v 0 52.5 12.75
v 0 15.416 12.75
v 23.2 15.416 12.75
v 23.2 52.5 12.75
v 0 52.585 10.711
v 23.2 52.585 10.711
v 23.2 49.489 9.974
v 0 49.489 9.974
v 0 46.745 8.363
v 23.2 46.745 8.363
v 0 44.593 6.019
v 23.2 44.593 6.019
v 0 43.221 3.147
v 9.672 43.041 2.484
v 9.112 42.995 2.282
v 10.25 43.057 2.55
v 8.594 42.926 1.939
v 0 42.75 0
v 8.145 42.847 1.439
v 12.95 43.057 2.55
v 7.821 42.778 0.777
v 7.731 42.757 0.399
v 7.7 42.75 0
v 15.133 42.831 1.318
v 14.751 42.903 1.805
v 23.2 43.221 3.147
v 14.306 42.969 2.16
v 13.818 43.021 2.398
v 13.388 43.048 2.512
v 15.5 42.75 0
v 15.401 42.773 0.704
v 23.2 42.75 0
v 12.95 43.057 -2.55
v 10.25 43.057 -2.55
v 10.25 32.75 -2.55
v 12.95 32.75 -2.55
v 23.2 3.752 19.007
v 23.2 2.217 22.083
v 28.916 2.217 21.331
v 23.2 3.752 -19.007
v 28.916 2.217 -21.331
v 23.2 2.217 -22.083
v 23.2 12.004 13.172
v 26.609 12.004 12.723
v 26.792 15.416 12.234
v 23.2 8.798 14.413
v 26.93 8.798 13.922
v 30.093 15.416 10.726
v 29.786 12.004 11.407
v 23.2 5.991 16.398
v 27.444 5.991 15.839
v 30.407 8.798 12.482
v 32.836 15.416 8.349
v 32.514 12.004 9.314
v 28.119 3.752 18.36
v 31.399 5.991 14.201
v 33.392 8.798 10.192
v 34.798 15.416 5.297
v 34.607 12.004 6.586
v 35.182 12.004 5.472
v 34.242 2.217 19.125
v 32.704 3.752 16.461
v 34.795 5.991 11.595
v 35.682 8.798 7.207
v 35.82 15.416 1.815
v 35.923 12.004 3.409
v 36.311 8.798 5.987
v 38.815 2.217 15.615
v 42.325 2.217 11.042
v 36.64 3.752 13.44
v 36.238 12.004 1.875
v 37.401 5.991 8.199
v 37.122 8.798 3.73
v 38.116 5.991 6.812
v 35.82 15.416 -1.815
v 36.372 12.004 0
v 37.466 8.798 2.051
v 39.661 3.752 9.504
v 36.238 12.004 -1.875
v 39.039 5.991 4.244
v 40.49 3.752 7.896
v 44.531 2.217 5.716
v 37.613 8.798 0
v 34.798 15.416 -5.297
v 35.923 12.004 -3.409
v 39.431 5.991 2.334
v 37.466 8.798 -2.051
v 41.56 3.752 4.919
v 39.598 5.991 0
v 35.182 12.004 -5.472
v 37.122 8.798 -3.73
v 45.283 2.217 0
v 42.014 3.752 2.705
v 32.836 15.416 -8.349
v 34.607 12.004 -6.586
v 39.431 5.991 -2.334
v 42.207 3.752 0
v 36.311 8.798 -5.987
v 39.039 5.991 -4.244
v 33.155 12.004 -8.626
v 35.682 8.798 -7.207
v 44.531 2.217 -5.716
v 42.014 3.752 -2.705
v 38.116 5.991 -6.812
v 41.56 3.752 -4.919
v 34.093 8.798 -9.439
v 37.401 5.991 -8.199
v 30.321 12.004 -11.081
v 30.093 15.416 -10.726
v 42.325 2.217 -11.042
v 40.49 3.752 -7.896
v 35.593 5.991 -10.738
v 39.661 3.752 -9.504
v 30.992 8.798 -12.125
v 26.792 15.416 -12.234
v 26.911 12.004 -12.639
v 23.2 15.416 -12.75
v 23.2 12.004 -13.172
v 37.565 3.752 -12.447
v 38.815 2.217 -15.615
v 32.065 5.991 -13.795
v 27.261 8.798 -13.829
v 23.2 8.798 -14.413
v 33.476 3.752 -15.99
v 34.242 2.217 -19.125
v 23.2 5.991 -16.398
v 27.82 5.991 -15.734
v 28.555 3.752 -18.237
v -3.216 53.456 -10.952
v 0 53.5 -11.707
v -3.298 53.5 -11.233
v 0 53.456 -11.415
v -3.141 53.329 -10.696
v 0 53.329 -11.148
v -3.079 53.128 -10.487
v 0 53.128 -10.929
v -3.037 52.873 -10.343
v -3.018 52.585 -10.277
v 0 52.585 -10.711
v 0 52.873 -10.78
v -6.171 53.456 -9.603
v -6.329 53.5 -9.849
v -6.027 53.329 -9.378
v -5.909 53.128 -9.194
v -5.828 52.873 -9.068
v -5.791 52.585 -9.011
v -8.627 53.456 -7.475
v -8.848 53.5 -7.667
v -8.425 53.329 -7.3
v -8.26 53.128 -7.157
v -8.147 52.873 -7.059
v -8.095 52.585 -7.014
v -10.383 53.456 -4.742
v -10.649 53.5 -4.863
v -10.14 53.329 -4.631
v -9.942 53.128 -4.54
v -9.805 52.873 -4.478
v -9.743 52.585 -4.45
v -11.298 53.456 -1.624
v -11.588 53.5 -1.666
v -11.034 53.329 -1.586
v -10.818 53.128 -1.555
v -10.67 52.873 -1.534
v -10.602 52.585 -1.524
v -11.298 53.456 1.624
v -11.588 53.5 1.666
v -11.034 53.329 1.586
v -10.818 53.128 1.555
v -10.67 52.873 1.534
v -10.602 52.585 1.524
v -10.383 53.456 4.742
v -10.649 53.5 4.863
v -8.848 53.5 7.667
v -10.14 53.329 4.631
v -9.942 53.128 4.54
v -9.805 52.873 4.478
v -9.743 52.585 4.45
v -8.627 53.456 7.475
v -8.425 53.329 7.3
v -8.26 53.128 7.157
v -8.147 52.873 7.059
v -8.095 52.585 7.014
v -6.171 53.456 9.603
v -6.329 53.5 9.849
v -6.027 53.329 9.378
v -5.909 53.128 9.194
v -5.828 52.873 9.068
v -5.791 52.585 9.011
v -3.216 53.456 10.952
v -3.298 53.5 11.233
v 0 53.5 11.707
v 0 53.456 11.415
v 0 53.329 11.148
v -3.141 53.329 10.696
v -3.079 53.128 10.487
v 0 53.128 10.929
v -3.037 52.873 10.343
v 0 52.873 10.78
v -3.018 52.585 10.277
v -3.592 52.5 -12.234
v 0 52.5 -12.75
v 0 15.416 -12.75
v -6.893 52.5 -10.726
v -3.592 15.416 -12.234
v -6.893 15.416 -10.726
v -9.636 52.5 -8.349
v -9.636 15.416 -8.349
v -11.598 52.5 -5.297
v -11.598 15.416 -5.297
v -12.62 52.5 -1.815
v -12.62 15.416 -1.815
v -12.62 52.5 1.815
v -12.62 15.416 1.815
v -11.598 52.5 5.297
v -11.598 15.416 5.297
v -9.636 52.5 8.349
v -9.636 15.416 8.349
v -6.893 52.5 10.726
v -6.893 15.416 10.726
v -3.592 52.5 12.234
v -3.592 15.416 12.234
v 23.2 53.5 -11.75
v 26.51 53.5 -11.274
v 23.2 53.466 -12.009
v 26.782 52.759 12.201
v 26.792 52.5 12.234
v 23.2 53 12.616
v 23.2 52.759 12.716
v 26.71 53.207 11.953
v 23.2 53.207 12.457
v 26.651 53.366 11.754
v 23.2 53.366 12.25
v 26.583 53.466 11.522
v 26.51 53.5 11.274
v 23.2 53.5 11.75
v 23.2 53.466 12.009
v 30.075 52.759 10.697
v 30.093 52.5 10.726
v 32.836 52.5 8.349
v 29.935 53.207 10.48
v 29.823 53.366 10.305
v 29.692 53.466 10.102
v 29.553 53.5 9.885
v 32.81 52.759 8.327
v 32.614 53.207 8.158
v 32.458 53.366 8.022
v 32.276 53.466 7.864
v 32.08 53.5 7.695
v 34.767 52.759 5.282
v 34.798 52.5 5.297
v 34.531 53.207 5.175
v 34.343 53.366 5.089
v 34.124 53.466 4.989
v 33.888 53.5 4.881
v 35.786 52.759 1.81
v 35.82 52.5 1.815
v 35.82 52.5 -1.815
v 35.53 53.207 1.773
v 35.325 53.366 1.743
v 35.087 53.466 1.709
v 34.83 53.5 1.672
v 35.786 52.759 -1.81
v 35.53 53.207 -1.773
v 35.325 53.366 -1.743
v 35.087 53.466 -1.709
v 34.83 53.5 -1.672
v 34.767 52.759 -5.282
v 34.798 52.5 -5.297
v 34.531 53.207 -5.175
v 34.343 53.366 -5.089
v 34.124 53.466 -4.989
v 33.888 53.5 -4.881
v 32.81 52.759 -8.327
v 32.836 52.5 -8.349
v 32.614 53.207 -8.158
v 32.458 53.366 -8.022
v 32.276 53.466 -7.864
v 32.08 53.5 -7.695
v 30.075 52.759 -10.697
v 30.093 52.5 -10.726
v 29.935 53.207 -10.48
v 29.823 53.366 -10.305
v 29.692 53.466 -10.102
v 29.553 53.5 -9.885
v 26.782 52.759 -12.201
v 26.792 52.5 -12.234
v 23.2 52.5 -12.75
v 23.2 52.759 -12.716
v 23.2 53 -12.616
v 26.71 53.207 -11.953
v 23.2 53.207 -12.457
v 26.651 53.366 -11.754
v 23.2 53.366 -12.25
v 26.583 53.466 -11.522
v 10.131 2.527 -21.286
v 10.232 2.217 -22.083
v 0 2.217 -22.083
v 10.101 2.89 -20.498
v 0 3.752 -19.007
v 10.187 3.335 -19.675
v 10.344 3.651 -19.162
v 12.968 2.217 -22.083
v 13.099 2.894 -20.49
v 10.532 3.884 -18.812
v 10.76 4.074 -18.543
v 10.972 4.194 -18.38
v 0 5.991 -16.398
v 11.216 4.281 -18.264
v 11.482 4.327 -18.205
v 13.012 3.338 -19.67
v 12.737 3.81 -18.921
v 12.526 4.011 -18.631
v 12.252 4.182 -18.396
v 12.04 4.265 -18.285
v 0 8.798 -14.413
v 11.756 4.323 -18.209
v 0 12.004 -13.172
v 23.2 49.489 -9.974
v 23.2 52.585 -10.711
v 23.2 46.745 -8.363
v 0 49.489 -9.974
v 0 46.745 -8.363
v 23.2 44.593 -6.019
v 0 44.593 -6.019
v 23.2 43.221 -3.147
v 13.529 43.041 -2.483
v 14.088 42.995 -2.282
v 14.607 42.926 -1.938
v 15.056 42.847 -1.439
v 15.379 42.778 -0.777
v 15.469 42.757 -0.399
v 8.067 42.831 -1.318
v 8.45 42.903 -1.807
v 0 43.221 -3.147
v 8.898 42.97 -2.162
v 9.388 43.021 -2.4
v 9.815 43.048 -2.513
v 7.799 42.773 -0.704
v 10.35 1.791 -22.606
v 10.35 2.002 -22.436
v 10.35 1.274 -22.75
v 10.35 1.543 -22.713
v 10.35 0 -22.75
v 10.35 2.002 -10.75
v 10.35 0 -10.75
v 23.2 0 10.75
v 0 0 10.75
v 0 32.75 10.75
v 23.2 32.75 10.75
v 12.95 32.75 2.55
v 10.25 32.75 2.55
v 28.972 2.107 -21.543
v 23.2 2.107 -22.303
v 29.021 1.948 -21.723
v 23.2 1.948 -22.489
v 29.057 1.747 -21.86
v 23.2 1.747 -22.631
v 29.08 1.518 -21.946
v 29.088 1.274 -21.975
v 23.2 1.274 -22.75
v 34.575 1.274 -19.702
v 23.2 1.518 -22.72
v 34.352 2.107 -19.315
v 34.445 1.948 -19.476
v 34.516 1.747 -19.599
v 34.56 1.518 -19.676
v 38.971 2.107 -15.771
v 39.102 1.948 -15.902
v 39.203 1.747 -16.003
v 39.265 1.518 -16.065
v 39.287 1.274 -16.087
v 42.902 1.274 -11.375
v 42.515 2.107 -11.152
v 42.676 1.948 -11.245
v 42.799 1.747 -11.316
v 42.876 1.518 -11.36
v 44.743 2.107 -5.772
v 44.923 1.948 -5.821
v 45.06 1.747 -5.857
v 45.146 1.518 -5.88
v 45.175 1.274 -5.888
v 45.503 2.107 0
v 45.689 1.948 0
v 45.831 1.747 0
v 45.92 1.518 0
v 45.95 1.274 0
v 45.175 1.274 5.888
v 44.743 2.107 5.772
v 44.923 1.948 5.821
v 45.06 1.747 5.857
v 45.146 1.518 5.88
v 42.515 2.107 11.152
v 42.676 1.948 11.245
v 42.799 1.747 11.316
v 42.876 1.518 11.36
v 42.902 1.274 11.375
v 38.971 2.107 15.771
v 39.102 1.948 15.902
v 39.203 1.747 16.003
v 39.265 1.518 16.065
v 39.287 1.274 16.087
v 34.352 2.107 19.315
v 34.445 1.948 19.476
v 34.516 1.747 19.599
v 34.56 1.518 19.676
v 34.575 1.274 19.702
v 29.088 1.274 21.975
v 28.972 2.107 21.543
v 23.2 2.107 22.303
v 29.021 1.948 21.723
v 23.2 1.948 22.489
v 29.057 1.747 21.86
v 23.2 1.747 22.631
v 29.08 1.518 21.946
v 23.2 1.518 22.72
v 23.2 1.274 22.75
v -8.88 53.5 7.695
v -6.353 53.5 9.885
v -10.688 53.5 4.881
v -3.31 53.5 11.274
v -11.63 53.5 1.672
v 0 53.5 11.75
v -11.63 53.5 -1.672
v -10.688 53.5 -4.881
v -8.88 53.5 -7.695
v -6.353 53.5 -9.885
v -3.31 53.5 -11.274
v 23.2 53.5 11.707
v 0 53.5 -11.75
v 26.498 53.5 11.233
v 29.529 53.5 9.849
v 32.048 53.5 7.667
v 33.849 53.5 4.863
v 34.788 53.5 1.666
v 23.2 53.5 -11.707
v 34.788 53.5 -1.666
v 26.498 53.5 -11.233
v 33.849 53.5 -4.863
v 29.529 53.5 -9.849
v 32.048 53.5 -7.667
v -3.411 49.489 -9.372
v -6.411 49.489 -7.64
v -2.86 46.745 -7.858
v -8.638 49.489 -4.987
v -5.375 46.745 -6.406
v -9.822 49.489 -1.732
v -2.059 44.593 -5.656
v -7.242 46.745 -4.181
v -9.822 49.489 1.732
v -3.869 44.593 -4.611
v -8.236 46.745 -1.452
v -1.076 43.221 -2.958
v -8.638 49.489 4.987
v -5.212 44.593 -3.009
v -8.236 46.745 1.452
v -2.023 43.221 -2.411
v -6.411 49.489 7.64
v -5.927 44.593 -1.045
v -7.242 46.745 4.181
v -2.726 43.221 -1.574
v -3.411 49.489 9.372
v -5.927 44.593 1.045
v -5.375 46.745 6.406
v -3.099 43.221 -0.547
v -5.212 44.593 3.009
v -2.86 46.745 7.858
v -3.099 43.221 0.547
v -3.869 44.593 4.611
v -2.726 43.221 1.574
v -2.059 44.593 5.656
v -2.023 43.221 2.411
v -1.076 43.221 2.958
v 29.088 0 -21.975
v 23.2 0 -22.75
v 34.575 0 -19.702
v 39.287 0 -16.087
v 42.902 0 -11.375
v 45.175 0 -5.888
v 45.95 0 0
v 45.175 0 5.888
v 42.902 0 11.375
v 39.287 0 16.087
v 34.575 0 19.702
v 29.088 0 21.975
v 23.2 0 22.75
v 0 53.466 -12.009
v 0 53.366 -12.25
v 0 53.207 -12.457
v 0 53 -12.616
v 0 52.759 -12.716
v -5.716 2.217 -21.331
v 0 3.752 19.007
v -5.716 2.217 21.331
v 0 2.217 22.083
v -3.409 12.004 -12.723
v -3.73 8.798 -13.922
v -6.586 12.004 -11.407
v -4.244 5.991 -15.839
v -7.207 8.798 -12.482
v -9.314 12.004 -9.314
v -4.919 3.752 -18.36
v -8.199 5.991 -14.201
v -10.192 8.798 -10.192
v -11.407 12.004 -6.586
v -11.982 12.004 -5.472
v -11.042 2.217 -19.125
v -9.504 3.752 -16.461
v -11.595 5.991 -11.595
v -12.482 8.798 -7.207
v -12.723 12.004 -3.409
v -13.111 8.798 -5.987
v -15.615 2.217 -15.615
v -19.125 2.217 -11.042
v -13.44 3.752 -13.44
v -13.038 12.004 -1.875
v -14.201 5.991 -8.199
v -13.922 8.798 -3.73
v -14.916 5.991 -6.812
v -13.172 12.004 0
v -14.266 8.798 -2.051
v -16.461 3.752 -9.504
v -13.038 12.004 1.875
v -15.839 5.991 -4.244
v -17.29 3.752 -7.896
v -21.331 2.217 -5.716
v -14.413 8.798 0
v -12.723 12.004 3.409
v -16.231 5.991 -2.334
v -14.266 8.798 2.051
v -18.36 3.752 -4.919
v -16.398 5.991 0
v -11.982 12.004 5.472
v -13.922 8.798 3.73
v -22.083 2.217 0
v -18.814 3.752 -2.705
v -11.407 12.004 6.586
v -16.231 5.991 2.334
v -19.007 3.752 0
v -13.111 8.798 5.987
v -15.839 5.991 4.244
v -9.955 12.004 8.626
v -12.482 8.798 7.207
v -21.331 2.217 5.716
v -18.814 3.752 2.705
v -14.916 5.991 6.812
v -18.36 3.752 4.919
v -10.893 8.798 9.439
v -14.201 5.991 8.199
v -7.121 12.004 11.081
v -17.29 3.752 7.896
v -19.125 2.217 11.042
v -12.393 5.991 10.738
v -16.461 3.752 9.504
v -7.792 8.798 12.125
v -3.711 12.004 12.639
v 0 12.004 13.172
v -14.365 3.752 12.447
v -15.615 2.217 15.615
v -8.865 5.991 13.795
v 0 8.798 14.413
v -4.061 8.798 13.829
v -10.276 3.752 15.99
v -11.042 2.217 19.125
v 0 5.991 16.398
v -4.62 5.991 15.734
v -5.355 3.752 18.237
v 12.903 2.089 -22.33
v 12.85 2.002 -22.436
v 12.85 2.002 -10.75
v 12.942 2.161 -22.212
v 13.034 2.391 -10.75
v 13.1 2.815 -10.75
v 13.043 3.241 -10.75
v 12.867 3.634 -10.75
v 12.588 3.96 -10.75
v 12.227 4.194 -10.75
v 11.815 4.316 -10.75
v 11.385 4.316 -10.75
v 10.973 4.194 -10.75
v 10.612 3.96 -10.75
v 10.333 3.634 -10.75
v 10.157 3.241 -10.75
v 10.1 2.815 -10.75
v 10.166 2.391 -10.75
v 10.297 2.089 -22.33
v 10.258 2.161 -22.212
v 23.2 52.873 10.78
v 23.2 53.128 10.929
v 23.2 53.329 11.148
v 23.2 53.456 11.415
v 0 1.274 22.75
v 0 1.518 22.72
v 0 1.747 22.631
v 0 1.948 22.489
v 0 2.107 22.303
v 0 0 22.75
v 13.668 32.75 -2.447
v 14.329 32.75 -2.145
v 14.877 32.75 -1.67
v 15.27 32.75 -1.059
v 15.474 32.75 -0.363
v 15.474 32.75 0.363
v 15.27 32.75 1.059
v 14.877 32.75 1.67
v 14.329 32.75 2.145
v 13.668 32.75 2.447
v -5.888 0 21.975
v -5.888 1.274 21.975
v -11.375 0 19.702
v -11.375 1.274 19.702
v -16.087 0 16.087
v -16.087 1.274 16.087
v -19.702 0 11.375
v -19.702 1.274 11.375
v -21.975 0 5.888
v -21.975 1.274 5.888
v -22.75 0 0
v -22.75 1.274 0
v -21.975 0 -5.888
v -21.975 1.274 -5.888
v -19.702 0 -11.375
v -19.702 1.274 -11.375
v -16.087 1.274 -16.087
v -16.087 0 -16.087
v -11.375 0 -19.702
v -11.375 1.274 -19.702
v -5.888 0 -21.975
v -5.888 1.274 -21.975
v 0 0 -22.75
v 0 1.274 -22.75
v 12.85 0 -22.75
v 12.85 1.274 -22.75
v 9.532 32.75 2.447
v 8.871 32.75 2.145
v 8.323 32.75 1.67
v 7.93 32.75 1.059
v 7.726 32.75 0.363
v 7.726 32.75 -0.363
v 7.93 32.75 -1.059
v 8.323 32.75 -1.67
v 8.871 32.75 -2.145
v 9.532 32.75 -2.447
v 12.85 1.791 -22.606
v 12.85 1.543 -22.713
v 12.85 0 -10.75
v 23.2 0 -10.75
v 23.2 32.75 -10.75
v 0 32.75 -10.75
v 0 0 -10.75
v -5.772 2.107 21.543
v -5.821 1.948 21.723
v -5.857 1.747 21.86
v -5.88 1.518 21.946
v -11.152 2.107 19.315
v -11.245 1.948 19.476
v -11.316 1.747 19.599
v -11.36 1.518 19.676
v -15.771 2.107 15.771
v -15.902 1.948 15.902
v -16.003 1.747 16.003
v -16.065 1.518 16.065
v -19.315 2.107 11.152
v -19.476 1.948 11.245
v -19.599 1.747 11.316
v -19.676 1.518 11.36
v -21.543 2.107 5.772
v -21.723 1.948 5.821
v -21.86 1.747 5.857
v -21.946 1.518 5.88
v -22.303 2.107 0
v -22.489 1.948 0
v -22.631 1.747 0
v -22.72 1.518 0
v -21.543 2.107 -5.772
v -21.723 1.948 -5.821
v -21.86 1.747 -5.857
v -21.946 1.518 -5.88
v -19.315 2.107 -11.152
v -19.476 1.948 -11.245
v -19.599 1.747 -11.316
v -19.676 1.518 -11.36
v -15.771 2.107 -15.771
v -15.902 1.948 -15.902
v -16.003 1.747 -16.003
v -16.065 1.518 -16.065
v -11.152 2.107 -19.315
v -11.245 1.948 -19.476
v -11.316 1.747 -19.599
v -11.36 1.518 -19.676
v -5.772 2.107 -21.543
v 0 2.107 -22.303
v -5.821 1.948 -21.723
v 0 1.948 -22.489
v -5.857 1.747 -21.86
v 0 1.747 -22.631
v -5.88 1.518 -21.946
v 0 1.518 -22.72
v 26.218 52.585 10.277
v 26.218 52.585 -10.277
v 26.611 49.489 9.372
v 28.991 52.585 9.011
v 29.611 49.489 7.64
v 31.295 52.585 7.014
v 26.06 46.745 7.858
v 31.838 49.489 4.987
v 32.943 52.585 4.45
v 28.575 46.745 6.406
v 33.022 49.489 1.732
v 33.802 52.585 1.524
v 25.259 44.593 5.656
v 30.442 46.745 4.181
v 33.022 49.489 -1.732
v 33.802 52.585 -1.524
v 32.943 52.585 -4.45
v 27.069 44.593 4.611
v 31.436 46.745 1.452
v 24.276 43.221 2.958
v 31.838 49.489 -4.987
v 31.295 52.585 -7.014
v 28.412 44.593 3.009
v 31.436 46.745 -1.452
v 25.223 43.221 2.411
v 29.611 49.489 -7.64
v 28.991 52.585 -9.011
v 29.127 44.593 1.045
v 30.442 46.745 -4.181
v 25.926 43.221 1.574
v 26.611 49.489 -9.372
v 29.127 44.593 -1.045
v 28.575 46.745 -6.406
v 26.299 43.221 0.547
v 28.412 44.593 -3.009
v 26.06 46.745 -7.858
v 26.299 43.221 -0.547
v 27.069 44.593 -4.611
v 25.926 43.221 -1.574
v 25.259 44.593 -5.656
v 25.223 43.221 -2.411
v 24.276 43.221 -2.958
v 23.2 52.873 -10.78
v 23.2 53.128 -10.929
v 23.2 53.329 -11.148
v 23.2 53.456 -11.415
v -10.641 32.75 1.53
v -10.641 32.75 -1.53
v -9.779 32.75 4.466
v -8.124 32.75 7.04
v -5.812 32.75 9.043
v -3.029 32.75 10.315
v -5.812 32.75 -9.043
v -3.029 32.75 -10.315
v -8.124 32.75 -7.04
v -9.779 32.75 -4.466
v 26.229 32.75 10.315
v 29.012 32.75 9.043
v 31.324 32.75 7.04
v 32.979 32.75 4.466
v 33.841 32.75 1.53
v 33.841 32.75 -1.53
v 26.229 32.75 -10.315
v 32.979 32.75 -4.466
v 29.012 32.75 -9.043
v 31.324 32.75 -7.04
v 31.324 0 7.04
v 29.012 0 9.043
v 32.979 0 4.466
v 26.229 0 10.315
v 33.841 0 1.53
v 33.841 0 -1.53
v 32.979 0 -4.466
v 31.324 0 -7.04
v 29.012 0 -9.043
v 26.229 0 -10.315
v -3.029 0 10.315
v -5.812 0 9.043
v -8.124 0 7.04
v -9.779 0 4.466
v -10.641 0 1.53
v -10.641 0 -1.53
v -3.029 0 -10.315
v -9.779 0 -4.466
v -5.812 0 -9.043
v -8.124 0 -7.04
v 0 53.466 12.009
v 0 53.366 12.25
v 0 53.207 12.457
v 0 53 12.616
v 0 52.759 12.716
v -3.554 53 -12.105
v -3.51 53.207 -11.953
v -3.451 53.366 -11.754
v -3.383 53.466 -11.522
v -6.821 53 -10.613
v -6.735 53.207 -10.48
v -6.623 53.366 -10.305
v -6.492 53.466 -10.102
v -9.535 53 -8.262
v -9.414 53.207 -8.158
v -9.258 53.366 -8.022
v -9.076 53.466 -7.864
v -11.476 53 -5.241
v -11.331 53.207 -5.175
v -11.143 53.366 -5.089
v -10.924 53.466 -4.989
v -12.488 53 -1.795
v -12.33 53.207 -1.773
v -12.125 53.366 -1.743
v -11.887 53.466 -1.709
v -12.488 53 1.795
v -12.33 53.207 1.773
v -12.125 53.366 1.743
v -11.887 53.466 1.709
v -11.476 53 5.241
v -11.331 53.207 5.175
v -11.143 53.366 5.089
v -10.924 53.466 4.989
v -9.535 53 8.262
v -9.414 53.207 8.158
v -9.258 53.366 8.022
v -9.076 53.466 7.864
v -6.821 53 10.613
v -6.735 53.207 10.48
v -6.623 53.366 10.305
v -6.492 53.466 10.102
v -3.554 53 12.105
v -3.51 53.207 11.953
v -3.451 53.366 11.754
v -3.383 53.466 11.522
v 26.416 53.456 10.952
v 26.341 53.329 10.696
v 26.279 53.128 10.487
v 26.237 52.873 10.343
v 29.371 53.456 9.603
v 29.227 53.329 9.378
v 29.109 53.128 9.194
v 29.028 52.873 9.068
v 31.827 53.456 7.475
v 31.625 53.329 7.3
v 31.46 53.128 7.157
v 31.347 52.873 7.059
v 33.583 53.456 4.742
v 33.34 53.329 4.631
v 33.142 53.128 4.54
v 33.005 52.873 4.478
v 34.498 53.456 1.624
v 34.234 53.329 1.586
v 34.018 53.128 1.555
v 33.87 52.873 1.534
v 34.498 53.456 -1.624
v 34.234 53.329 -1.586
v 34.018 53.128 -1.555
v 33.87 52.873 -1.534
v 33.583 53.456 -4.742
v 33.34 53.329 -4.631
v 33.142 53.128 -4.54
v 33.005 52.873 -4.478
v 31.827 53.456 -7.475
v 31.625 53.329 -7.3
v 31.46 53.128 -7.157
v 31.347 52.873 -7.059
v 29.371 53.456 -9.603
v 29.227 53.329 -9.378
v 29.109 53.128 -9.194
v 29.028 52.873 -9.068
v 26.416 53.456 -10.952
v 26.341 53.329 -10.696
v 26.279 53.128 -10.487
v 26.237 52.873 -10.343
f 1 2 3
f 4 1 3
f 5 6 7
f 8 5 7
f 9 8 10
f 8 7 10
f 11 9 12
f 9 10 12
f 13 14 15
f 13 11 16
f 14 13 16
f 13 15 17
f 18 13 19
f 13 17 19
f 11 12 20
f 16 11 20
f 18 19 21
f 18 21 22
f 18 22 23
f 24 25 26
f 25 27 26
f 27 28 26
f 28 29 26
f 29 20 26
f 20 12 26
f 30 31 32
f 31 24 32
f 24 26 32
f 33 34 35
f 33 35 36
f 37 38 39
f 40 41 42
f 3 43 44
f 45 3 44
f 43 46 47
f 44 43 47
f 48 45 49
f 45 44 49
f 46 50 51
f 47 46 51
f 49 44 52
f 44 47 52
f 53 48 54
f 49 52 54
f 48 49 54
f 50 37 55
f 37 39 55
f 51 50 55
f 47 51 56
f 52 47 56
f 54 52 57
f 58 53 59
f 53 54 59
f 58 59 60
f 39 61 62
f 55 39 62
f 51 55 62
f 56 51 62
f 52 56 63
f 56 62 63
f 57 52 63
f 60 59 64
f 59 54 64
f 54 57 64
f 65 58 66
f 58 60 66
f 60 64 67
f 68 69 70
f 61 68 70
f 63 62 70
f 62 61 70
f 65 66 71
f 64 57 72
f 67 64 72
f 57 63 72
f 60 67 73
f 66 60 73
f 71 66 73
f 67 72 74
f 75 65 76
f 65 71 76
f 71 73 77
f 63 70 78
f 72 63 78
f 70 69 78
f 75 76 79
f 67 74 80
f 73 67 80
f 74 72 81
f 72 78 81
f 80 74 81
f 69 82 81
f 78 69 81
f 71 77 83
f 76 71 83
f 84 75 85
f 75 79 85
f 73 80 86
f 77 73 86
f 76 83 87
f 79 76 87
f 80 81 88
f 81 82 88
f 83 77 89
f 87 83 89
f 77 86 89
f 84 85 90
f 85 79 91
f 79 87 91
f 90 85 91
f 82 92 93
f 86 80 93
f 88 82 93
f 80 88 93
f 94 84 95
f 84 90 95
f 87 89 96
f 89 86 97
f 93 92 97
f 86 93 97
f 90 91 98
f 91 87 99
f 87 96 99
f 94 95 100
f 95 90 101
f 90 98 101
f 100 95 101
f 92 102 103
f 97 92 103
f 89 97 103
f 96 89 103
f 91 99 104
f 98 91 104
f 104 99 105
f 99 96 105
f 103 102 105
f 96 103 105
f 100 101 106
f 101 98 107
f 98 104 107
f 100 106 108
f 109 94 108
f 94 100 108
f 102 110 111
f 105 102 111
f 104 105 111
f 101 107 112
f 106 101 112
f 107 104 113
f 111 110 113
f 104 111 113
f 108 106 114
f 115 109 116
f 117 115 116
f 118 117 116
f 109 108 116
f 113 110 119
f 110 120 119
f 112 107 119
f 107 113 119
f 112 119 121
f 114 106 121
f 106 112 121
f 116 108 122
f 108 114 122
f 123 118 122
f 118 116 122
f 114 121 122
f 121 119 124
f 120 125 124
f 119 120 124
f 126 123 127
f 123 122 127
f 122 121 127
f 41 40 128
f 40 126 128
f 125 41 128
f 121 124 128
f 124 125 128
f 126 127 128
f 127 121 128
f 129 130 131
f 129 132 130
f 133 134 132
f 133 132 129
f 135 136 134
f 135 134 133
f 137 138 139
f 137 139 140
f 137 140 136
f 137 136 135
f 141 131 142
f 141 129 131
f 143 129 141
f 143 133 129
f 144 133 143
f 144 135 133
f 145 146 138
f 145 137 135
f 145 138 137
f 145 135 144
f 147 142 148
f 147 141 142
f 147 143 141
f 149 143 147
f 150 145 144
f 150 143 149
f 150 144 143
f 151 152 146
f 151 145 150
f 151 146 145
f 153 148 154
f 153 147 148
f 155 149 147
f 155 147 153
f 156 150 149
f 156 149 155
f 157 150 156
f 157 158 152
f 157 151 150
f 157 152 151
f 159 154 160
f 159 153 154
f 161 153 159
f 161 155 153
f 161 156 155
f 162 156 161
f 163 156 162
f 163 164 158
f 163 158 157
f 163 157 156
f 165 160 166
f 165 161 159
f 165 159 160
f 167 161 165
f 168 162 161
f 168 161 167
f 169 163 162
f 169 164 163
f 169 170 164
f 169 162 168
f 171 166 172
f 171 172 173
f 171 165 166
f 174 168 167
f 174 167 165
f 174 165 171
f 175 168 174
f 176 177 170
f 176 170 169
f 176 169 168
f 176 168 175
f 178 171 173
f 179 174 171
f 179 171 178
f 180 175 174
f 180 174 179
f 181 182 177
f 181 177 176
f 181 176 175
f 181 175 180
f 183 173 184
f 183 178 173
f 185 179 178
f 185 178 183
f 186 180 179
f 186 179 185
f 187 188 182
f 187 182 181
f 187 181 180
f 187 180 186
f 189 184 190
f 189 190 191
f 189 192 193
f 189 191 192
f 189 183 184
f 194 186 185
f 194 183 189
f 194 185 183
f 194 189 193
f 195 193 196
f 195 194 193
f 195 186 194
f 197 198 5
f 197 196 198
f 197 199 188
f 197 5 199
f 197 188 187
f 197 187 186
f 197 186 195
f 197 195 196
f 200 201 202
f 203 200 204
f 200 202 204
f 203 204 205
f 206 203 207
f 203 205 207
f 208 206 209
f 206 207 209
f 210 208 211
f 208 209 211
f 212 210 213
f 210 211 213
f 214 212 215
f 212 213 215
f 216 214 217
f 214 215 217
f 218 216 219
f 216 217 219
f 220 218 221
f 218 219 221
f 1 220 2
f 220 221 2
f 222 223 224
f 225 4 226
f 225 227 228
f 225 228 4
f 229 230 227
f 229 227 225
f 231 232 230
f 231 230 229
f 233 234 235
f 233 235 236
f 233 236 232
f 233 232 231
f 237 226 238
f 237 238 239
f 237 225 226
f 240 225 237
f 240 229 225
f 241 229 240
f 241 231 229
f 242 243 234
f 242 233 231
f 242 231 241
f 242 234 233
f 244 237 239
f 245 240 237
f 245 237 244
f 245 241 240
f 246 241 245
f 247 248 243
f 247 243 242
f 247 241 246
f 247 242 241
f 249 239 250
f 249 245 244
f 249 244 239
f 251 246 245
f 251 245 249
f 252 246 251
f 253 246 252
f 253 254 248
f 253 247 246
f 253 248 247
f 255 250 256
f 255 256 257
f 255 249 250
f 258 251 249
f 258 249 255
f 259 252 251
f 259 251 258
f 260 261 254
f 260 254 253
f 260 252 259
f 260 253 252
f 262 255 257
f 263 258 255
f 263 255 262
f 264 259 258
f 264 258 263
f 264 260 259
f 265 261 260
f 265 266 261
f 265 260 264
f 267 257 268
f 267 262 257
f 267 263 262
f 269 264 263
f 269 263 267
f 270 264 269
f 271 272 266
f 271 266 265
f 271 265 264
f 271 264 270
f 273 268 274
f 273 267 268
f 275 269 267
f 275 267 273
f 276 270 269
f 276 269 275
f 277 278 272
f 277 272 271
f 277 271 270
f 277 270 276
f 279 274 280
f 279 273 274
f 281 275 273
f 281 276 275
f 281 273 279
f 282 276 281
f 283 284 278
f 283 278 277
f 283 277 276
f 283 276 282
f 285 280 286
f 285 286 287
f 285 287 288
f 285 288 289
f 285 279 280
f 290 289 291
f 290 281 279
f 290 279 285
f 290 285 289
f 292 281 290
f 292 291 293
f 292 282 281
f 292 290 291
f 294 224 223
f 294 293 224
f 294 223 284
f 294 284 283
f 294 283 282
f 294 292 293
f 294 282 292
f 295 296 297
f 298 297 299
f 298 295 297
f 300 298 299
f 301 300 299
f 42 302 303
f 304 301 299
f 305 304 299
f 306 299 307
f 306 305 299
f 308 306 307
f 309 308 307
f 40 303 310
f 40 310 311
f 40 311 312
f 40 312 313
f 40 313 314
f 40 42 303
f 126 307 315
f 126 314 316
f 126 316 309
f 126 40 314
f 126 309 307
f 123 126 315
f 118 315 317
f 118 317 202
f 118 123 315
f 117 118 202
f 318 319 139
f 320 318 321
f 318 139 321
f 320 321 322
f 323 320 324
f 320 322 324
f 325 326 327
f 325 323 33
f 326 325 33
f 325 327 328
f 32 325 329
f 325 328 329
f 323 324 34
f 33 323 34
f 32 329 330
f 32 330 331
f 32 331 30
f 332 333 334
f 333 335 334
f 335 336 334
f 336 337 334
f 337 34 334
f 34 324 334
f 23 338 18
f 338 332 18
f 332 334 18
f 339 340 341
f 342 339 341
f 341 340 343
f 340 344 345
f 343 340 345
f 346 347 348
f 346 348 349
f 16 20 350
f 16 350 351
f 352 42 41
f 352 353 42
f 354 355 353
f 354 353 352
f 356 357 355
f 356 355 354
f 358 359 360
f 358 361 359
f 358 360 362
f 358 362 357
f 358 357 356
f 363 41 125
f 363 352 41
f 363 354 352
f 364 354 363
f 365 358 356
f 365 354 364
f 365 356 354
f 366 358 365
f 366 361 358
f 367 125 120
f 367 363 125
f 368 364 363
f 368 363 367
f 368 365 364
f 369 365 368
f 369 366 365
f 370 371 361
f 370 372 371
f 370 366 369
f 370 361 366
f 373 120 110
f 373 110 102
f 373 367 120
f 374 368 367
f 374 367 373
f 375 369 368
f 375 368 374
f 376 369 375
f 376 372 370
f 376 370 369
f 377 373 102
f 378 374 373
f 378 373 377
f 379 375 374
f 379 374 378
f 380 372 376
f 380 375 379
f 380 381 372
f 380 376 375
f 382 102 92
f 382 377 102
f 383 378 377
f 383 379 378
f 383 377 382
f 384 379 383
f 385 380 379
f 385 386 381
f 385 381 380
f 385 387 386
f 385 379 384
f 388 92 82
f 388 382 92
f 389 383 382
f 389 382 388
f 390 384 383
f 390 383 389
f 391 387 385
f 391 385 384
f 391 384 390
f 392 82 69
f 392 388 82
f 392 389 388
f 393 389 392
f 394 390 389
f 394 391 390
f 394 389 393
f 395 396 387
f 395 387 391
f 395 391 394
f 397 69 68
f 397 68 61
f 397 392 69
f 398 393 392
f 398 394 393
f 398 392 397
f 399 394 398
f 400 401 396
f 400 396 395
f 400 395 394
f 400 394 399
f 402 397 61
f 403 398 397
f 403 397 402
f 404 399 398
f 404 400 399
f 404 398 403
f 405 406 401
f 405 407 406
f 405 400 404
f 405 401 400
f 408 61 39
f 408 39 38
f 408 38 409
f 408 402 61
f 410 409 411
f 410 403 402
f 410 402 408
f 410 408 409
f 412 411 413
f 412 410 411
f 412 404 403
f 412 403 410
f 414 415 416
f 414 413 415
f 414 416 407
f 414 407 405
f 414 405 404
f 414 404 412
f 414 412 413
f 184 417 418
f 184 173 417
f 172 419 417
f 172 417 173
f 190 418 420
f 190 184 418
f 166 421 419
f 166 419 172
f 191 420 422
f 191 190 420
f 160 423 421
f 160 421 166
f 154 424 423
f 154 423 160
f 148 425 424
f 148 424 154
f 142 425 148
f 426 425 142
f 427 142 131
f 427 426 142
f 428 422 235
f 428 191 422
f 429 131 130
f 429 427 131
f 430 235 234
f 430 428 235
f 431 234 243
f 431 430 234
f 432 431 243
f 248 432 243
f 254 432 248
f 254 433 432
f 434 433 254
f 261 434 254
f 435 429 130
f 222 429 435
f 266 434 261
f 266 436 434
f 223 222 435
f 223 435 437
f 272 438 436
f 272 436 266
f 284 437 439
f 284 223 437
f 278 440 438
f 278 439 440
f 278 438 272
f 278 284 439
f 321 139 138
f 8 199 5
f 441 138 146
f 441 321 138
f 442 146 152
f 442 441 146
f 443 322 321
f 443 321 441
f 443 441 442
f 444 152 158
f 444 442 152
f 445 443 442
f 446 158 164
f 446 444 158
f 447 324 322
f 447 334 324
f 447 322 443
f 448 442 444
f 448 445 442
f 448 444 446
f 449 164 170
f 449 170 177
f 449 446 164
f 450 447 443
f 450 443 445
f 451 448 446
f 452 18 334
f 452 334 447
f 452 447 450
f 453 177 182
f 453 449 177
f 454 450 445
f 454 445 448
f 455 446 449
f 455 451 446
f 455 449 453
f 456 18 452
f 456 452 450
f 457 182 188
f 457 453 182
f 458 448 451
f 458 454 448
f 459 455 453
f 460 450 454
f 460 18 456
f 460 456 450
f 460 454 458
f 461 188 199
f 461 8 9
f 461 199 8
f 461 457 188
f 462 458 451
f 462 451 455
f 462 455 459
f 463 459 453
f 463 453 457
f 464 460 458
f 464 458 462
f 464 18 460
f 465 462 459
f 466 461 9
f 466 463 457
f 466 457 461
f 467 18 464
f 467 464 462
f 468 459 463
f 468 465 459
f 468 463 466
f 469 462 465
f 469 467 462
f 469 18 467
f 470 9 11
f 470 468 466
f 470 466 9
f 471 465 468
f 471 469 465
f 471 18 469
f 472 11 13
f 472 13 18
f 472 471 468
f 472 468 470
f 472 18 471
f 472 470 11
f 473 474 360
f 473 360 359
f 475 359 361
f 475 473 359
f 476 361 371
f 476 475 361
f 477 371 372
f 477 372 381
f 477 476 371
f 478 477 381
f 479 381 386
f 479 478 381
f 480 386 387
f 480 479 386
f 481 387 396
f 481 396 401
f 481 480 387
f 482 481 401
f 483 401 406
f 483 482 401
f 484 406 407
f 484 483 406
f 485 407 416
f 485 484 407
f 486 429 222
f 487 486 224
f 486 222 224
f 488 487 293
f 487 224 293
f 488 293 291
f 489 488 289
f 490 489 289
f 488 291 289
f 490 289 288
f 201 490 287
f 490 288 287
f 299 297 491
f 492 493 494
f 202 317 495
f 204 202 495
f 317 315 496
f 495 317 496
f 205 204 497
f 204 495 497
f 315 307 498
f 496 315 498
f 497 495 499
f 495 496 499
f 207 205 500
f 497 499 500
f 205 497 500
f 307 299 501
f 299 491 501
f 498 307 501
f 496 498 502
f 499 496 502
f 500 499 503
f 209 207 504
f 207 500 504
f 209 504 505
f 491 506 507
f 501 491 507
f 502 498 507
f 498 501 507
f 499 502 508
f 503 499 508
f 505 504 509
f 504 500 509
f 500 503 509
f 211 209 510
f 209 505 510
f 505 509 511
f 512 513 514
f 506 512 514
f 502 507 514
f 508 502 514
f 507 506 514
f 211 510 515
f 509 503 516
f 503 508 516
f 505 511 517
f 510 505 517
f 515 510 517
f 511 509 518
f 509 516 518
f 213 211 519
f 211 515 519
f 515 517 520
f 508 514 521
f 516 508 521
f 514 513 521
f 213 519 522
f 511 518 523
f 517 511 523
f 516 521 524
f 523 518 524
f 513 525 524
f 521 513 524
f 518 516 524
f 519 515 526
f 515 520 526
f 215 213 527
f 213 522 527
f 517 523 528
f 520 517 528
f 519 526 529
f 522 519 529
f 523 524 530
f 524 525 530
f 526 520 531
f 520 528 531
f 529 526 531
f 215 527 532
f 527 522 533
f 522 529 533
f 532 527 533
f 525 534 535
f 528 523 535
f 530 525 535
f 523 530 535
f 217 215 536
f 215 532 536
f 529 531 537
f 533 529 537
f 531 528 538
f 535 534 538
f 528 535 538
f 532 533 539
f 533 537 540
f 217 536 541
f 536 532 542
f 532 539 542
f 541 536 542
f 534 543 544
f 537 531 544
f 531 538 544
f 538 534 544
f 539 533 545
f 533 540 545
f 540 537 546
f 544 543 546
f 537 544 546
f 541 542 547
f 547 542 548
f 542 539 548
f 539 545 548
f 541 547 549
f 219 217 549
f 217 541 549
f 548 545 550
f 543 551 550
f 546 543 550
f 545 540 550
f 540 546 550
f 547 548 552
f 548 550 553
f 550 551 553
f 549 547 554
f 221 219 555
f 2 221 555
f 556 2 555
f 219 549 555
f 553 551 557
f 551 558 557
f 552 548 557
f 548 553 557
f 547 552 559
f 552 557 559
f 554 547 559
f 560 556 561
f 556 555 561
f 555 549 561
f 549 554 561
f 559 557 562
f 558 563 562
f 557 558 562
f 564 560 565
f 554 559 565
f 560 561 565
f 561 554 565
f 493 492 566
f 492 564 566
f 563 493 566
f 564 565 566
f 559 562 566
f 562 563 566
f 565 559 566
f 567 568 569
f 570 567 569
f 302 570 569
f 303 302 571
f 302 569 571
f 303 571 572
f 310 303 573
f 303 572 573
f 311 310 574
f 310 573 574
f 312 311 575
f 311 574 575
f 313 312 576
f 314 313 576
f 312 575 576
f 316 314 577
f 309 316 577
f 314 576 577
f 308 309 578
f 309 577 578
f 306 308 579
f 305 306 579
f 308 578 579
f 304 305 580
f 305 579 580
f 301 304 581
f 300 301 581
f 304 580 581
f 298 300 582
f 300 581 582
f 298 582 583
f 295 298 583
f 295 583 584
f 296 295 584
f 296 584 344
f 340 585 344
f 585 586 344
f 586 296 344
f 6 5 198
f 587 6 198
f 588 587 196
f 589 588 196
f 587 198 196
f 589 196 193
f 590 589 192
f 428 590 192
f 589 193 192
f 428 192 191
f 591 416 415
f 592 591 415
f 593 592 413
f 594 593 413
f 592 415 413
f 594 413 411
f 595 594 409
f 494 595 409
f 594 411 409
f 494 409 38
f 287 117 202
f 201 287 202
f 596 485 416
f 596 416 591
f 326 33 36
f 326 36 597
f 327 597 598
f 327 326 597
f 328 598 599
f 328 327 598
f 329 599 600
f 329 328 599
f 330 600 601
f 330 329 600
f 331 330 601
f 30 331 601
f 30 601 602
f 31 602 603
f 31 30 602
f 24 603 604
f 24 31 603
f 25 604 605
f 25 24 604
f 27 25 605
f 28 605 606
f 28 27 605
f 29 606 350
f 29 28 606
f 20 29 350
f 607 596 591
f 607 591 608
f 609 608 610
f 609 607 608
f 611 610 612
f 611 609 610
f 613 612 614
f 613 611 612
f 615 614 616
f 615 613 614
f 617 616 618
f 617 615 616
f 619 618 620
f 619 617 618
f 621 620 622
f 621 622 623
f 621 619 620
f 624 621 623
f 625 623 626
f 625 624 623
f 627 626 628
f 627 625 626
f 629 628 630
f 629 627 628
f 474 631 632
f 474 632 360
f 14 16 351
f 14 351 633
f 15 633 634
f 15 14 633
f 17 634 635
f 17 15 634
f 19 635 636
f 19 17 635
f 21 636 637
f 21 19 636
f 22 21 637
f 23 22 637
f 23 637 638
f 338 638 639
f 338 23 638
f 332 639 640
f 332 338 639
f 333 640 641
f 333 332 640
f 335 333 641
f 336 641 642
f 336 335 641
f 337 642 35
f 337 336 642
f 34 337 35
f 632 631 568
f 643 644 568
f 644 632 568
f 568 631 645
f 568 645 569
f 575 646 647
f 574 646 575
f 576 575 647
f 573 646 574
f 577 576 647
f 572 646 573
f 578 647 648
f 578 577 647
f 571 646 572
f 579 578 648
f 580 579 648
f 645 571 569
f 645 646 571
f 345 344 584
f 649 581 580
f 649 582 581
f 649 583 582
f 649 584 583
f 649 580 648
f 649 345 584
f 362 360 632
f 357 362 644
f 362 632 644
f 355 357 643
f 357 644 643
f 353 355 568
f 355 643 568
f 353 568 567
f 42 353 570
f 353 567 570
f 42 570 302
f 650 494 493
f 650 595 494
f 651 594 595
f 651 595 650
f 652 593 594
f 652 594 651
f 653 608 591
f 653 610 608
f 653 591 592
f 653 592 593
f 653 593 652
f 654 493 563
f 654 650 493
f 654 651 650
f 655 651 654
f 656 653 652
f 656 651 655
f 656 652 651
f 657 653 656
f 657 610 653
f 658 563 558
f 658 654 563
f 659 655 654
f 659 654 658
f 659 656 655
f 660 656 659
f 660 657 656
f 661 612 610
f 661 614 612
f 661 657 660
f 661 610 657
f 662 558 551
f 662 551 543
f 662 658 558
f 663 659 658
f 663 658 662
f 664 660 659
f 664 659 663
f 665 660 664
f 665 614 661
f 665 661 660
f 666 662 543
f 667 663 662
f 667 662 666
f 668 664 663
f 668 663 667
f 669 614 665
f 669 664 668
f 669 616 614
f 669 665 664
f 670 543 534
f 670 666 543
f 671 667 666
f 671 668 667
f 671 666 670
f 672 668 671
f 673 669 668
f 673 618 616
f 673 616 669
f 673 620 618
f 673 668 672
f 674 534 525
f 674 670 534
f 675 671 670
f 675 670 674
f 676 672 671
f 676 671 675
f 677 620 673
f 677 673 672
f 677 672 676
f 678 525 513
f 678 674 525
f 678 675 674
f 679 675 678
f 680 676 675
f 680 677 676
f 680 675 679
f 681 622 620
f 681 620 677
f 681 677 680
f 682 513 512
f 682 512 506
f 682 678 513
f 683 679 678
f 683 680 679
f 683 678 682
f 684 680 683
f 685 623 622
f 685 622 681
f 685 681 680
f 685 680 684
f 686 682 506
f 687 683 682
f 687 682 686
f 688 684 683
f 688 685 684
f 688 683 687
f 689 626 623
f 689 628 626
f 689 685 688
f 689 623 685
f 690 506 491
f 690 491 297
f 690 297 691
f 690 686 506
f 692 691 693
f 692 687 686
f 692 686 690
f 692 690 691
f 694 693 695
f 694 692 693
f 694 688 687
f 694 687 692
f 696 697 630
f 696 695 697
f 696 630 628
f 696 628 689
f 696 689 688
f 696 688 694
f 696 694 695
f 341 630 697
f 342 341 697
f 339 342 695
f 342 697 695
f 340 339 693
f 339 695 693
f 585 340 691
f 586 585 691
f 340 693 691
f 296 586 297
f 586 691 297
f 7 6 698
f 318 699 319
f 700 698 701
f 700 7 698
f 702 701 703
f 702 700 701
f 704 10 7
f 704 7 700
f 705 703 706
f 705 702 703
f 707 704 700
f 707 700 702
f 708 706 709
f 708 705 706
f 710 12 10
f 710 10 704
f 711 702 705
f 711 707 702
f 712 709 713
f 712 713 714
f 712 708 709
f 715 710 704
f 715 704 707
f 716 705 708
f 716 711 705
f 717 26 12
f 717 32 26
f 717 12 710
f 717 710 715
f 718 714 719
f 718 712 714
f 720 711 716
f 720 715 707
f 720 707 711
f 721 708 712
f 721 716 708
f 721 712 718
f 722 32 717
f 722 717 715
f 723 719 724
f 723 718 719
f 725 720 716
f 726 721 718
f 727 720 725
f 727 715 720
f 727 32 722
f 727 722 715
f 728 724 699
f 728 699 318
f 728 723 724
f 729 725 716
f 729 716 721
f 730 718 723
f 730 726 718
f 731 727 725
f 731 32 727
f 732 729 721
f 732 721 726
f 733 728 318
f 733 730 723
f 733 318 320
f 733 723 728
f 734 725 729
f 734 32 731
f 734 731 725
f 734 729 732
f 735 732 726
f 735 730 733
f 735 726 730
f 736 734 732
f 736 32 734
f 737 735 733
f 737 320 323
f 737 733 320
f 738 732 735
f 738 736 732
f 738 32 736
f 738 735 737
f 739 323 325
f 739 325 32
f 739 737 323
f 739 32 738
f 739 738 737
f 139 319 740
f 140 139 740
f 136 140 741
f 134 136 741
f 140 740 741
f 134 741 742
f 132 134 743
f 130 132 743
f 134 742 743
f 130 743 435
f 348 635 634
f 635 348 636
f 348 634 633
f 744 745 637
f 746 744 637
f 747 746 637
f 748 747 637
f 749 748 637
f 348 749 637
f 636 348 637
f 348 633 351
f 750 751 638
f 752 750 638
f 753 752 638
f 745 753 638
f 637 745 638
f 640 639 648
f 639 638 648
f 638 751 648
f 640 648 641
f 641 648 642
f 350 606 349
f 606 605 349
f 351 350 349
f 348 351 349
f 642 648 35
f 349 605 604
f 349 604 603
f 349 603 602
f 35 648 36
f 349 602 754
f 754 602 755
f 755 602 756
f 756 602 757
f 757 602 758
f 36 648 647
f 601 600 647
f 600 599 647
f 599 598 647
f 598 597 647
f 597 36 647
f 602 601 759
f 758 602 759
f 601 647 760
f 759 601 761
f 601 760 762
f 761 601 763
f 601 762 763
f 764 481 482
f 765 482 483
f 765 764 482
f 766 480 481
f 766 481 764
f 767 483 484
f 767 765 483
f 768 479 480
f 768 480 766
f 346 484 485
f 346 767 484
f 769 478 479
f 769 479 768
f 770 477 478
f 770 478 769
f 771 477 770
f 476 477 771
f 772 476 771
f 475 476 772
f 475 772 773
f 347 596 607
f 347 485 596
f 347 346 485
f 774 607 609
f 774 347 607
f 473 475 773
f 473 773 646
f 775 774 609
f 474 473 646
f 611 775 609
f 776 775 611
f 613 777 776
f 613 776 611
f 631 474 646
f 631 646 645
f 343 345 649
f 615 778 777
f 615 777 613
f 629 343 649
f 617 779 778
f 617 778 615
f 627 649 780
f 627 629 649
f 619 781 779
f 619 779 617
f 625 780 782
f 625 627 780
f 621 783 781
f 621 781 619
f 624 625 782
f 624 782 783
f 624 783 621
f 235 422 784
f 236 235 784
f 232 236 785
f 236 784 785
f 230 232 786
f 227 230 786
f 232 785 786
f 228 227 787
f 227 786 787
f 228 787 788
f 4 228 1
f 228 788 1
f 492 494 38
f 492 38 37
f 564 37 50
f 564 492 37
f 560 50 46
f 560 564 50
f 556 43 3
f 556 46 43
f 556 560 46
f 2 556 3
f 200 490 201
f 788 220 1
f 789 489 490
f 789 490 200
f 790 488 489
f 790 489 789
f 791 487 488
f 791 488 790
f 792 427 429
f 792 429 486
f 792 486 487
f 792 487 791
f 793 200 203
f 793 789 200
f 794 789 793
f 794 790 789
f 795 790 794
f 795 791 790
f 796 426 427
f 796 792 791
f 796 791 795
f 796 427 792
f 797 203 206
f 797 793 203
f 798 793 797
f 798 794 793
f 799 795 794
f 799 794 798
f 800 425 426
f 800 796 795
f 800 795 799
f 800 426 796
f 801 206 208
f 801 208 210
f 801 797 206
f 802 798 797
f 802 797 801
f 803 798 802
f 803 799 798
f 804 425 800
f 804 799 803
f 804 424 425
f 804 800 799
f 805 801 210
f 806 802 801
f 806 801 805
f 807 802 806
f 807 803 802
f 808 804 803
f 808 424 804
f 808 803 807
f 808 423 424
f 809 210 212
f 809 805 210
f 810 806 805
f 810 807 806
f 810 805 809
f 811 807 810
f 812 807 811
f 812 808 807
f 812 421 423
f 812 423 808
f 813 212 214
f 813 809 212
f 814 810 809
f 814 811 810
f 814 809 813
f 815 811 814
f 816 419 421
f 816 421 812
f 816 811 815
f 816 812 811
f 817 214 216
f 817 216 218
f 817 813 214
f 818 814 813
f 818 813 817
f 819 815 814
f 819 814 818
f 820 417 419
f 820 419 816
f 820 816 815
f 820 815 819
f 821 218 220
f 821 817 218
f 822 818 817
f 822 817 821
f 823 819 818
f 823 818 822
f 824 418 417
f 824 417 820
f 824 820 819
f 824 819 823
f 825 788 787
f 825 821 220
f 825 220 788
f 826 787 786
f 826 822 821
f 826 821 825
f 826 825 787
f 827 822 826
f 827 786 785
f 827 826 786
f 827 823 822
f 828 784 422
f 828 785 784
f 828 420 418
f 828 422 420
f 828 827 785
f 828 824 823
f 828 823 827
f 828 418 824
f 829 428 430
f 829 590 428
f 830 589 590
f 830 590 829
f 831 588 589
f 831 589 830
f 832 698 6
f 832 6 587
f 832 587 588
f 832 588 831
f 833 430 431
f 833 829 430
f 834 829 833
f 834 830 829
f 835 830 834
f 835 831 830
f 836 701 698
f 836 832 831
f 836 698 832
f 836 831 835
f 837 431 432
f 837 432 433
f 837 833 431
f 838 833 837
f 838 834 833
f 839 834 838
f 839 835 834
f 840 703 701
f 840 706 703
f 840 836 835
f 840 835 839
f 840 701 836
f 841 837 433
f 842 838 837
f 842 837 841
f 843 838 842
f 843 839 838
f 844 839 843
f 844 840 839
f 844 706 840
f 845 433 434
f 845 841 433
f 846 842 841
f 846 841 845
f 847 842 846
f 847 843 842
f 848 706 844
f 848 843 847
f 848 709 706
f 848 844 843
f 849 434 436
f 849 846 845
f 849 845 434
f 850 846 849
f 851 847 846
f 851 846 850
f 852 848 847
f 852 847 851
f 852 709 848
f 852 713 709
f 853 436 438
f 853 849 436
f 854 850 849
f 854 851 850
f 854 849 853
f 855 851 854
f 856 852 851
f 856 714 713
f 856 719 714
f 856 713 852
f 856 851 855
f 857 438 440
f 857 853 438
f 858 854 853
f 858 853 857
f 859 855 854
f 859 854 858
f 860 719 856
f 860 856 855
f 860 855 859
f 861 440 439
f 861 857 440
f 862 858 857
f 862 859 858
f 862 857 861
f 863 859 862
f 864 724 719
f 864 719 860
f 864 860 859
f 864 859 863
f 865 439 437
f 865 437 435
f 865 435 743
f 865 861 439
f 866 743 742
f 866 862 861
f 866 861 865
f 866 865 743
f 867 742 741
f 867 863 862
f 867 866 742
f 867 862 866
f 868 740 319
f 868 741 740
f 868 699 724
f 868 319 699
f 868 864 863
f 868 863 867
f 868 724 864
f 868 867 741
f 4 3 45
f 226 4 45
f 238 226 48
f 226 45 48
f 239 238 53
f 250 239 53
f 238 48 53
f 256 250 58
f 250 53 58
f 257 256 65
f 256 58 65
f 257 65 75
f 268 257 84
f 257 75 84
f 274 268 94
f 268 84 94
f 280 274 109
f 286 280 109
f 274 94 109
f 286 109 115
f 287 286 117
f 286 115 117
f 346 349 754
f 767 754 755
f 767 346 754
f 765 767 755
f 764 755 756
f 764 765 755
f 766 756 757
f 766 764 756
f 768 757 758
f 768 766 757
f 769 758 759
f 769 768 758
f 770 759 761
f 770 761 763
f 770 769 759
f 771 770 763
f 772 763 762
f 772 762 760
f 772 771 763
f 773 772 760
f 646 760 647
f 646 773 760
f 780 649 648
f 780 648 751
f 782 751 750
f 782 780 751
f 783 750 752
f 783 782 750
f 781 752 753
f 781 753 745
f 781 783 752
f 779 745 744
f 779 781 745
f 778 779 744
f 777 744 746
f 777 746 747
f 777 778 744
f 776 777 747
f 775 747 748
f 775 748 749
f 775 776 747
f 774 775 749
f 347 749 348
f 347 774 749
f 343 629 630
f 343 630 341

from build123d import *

# Parameters (mm, degrees)
BOSS_EXTRUDE1_DEPTH     = 53.5
BOSS_EXTRUDE2_START     = 32.75
BOSS_EXTRUDE2_DEPTH     = 10
BOSS_EXTRUDE3_DEPTH     = 2
FILLET1_R               = 10.75
FILLET2_R               = 14
FILLET3_R               = 1
CUT_EXTRUDE4_DEPTH      = 79.076260797
CUT_EXTRUDE5_DEPTH      = 61.840180017
CUT_EXTRUDE5_DEPTH_BACK = 61.840180017


# Some blends are built 0.0001 mm under size
with BuildPart() as part:
    # Sketch2 → Boss-Extrude1 (new body)
    with BuildSketch(Plane(origin=(0, 0, 0), x_dir=(1, 0, 0), z_dir=(0, 1, 0))):
        with BuildLine():
            Line((0, -12.75), (23.2, -12.75))
            ThreePointArc((23.2, -12.75), (35.95, 0), (23.2, 12.75))
            Line((23.2, 12.75), (0, 12.75))
            ThreePointArc((0, 12.75), (-12.75, 0), (0, -12.75))
        make_face()
        with BuildLine():
            ThreePointArc((23.2, -10.75), (33.95, 0), (23.2, 10.75))
            Line((23.2, 10.75), (0, 10.75))
            ThreePointArc((0, 10.75), (-10.75, 0), (0, -10.75))
            Line((0, -10.75), (23.2, -10.75))
        make_face(mode=Mode.SUBTRACT)
    extrude(amount=BOSS_EXTRUDE1_DEPTH)

    # Sketch2<3> → Boss-Extrude2 (add)
    with BuildSketch(Plane(origin=(0, 0, 0), x_dir=(1, 0, 0), z_dir=(0, 1, 0)).offset(BOSS_EXTRUDE2_START)):
        with BuildLine():
            Line((0, -10.75), (23.2, -10.75))
            ThreePointArc((23.2, -10.75), (33.95, 0), (23.2, 10.75))
            Line((23.2, 10.75), (0, 10.75))
            ThreePointArc((0, 10.75), (-10.75, 0), (0, -10.75))
        make_face()
    extrude(amount=BOSS_EXTRUDE2_DEPTH)

    # Sketch2<4> → Boss-Extrude3 (add)
    with BuildSketch(Plane(origin=(0, 0, 0), x_dir=(1, 0, 0), z_dir=(0, 1, 0))):
        with BuildLine():
            Line((0, 22.75), (23.2, 22.75))
            ThreePointArc((23.2, 22.75), (45.95, 0), (23.2, -22.75))
            Line((23.2, -22.75), (0, -22.75))
            ThreePointArc((0, -22.75), (-22.75, 0), (0, 22.75))
        make_face()
        with BuildLine():
            ThreePointArc((23.2, -12.75), (35.95, 0), (23.2, 12.75))
            Line((23.2, 12.75), (0, 12.75))
            ThreePointArc((0, 12.75), (-12.75, 0), (0, -12.75))
            Line((0, -12.75), (23.2, -12.75))
        make_face(mode=Mode.SUBTRACT)
    extrude(amount=BOSS_EXTRUDE3_DEPTH)

    # Fillet1
    fillet1_edges = [part.edges().sort_by_distance(p)[0] for p in [
        (11.6, 42.75, -10.75),
        (33.95, 42.75, 0),
        (11.6, 42.75, 10.75),
        (-10.75, 42.75, 0),
    ]]
    fillet(fillet1_edges, radius=FILLET1_R - 0.0001)  # a hair under: the kernel refuses the full size

    # Fillet2
    # the kernel refuses this fillet: 14 mm, written as the material it adds along each edge
    with BuildSketch(Plane(origin=(23.2, 2, 0), x_dir=(0, 0, 1), z_dir=(-1, 0, 0))) as fillet2_piece_1:
        with BuildLine():
            CenterArc((26.75, 13.416407865), FILLET2_R, 180, 73.398450401)
            Line((22.75, 0), (22.67, -0.268328157))
            ThreePointArc((22.67, -0.268328157), (17.75, -0.28), (12.75, -0.28))
            Line((12.75, -0.28), (12.47, 0))
            Line((12.47, 0), (12.47, 13.416407865))
            Line((12.47, 13.416407865), (12.75, 13.416407865))
        make_face()
    revolve(axis=Axis((23.2, 2, 0), (0, 1, 0)), revolution_arc=180)
    with BuildSketch(Plane(origin=(0, 2, 12.75), x_dir=(0, 1, 0), z_dir=(1, 0, 0)), Plane(origin=(23.2, 2, -12.75), x_dir=(0, 1, 0), z_dir=(-1, 0, 0))) as fillet2_piece_2:
        with BuildLine():
            CenterArc((13.416407865, 14), FILLET2_R, 196.601549599, 73.398450401)
            Line((0, 10), (-0.268328157, 9.92))
            ThreePointArc((-0.268328157, 9.92), (-0.28, 5), (-0.28, 0))
            Line((-0.28, 0), (0, -0.28))
            Line((0, -0.28), (13.416407865, -0.28))
            Line((13.416407865, -0.28), (13.416407865, 0))
        make_face()
    extrude(amount=23.2)
    with BuildSketch(Plane(origin=(0, 2, 0), x_dir=(0, 0, -1), z_dir=(1, 0, 0))) as fillet2_piece_3:
        with BuildLine():
            CenterArc((26.75, 13.416407865), FILLET2_R, 180, 73.398450401)
            Line((22.75, 0), (22.67, -0.268328157))
            ThreePointArc((22.67, -0.268328157), (17.75, -0.28), (12.75, -0.28))
            Line((12.75, -0.28), (12.47, 0))
            Line((12.47, 0), (12.47, 13.416407865))
            Line((12.47, 13.416407865), (12.75, 13.416407865))
        make_face()
    revolve(axis=Axis((0, 2, 0), (0, 1, 0)), revolution_arc=180)

    # Fillet3
    # the kernel refuses this fillet: 1 mm, written as the material it takes off along each edge
    with BuildSketch(Plane(origin=(0, 53.5, 10.75), x_dir=(0, 0, 1), z_dir=(1, 0, 0)), Plane(origin=(23.2, 53.5, -10.75), x_dir=(0, 0, -1), z_dir=(-1, 0, 0))) as fillet3_piece_1:
        with BuildLine():
            CenterArc((0.957377651, 1), FILLET3_R, 184.881694581, 85.118305419)
            Line((-0.038994884, 0.914901403), (-0.138632138, 0.906391544))
            ThreePointArc((-0.138632138, 0.906391544), (-0.1, 0.0001), (-0.1, 0))
            Line((-0.1, 0), (0, -0.1))
            Line((0, -0.1), (0.957377651, -0.1))
            Line((0.957377651, -0.1), (0.957377651, 0))
        make_face()
    extrude(amount=23.2, mode=Mode.SUBTRACT)
    with BuildSketch(Plane(origin=(0, 53.5, 0), x_dir=(0, 0, -1), z_dir=(1, 0, 0))) as fillet3_piece_2:
        with BuildLine():
            CenterArc((11.707377651, -1), FILLET3_R, 90, 85.118305419)
            Line((10.711005116, -0.914901403), (10.611367862, -0.906391544))
            ThreePointArc((10.611367862, -0.906391544), (10.65, -0.0001), (10.65, 0))
            Line((10.65, 0), (10.75, 0.1))
            Line((10.75, 0.1), (11.707377651, 0.1))
            Line((11.707377651, 0.1), (11.707377651, 0))
        make_face()
    revolve(axis=Axis((0, 53.5, 0), (0, 1, 0)), revolution_arc=180, mode=Mode.SUBTRACT)
    with BuildSketch(Plane(origin=(0, 53.5, 12.75), x_dir=(0, -1, 0), z_dir=(1, 0, 0))) as fillet3_piece_3:
        with BuildLine():
            CenterArc((FILLET3_R, FILLET3_R), FILLET3_R, 180, 90)
            Line((0, FILLET3_R), (0, 0))
            Line((0, 0), (FILLET3_R, 0))
        make_face()
    extrude(amount=23.2, mode=Mode.SUBTRACT)
    with BuildSketch(Plane(origin=(23.2, 53.5, 0), x_dir=(0, 0, 1), z_dir=(-1, 0, 0))) as fillet3_piece_4:
        with BuildLine():
            CenterArc((12.75 - FILLET3_R, -FILLET3_R), FILLET3_R, 0, 90)
            Line((12.75, -FILLET3_R), (12.75, 0))
            Line((12.75, 0), (12.75 - FILLET3_R, 0))
        make_face()
    revolve(axis=Axis((23.2, 53.5, 0), (0, 1, 0)), revolution_arc=180, mode=Mode.SUBTRACT)
    with BuildSketch(Plane(origin=(23.2, 53.5, -12.75), x_dir=(0, 0, 1), z_dir=(-1, 0, 0))) as fillet3_piece_5:
        with BuildLine():
            CenterArc((FILLET3_R, -FILLET3_R), FILLET3_R, 90, 90)
            Line((0, -FILLET3_R), (0, 0))
            Line((0, 0), (FILLET3_R, 0))
        make_face()
    extrude(amount=23.2, mode=Mode.SUBTRACT)
    with BuildSketch(Plane(origin=(0, 53.5, 0), x_dir=(0, 0, -1), z_dir=(1, 0, 0))) as fillet3_piece_6:
        with BuildLine():
            CenterArc((12.75 - FILLET3_R, -FILLET3_R), FILLET3_R, 0, 90)
            Line((12.75 - FILLET3_R, 0), (12.75, 0))
            Line((12.75, 0), (12.75, -FILLET3_R))
        make_face()
    revolve(axis=Axis((0, 53.5, 0), (0, 1, 0)), revolution_arc=180, mode=Mode.SUBTRACT)
    with BuildSketch(Plane(origin=(0, 2, -22.75), x_dir=(0, 0.30962089103713925, 0.9508600863604318), z_dir=(1, 0, 0)), Plane(origin=(23.2, 2, 22.75), x_dir=(0, 0.30962089103713925, -0.9508600863604318), z_dir=(-1, 0, 0))) as fillet3_piece_7:
        with BuildLine():
            CenterArc((0.726159611, 0.99968645), FILLET3_R, 198.036385117, 70.528779366)
            Line((-0.224700475, 0.690065559), (0, 0))
            ThreePointArc((0, 0), (0.350559812, 0.004389695), (0.701119624, 0))
        make_face()
    extrude(amount=23.2, mode=Mode.SUBTRACT)
    with BuildSketch(Plane(origin=(0, 2, 0), x_dir=(0, 0, 1), z_dir=(1, 0, 0))) as fillet3_piece_8:
        with BuildLine():
            CenterArc((21.75, 0.725727759), FILLET3_R, 289.471220634, 70.528779366)
            Line((22.75, 0.725727759), (22.75, 0))
            ThreePointArc((22.75, 0), (22.415307525, -0.104366656), (22.083333333, -0.217081283))
        make_face()
    revolve(axis=Axis((0, 2, 0), (0, -1, 0)), revolution_arc=180, mode=Mode.SUBTRACT)
    with BuildSketch(Plane(origin=(23.2, 2, 0), x_dir=(0, 0, -1), z_dir=(-1, 0, 0))) as fillet3_piece_9:
        with BuildLine():
            CenterArc((21.75, 0.725727759), FILLET3_R, 289.471220634, 70.528779366)
            Line((22.75, 0.725727759), (22.75, 0))
            ThreePointArc((22.75, 0), (22.415307525, -0.104366656), (22.083333333, -0.217081283))
        make_face()
    revolve(axis=Axis((23.2, 2, 0), (0, -1, 0)), revolution_arc=180, mode=Mode.SUBTRACT)
    with BuildSketch(Plane(origin=(23.2, 53.5, 0), x_dir=(0, 0, 1), z_dir=(-1, 0, 0))) as fillet3_piece_10:
        with BuildLine():
            CenterArc((11.707377651, -1), FILLET3_R, 90, 85.118305419)
            Line((10.711005116, -0.914901403), (10.611367862, -0.906391544))
            ThreePointArc((10.611367862, -0.906391544), (10.65, -0.0001), (10.65, 0))
            Line((10.65, 0), (10.75, 0.1))
            Line((10.75, 0.1), (11.707377651, 0.1))
            Line((11.707377651, 0.1), (11.707377651, 0))
        make_face()
    revolve(axis=Axis((23.2, 53.5, 0), (0, 1, 0)), revolution_arc=180, mode=Mode.SUBTRACT)

    # Sketch4 → Cut-Extrude4 (cut, through all)
    with BuildSketch(Plane.XY.offset(-10.75)):
        with BuildLine():
            Line((11.6, 0), (12.85, 0))
            Line((12.85, 0), (12.85, 2.002168665))
            ThreePointArc((12.85, 2.002168665), (11.6, 4.331324862), (10.35, 2.002168665))
            Line((10.35, 2.002168665), (10.35, 0))
            Line((10.35, 0), (11.6, 0))
        make_face()
    extrude(amount=-CUT_EXTRUDE4_DEPTH, mode=Mode.SUBTRACT)

    # Sketch3 → Cut-Extrude5 (cut, two sides: drawn at the far end of the back side and taken through both)
    with BuildSketch(Plane.XZ.offset(-32.75).offset(-CUT_EXTRUDE5_DEPTH_BACK)):
        with BuildLine():
            Line((12.95, 2.55), (10.25, 2.55))
            ThreePointArc((10.25, 2.55), (7.7, 0), (10.25, -2.55))
            Line((10.25, -2.55), (12.95, -2.55))
            ThreePointArc((12.95, -2.55), (15.5, 0), (12.95, 2.55))
        make_face()
    extrude(amount=CUT_EXTRUDE5_DEPTH + CUT_EXTRUDE5_DEPTH_BACK, mode=Mode.SUBTRACT)


solid = part.part
